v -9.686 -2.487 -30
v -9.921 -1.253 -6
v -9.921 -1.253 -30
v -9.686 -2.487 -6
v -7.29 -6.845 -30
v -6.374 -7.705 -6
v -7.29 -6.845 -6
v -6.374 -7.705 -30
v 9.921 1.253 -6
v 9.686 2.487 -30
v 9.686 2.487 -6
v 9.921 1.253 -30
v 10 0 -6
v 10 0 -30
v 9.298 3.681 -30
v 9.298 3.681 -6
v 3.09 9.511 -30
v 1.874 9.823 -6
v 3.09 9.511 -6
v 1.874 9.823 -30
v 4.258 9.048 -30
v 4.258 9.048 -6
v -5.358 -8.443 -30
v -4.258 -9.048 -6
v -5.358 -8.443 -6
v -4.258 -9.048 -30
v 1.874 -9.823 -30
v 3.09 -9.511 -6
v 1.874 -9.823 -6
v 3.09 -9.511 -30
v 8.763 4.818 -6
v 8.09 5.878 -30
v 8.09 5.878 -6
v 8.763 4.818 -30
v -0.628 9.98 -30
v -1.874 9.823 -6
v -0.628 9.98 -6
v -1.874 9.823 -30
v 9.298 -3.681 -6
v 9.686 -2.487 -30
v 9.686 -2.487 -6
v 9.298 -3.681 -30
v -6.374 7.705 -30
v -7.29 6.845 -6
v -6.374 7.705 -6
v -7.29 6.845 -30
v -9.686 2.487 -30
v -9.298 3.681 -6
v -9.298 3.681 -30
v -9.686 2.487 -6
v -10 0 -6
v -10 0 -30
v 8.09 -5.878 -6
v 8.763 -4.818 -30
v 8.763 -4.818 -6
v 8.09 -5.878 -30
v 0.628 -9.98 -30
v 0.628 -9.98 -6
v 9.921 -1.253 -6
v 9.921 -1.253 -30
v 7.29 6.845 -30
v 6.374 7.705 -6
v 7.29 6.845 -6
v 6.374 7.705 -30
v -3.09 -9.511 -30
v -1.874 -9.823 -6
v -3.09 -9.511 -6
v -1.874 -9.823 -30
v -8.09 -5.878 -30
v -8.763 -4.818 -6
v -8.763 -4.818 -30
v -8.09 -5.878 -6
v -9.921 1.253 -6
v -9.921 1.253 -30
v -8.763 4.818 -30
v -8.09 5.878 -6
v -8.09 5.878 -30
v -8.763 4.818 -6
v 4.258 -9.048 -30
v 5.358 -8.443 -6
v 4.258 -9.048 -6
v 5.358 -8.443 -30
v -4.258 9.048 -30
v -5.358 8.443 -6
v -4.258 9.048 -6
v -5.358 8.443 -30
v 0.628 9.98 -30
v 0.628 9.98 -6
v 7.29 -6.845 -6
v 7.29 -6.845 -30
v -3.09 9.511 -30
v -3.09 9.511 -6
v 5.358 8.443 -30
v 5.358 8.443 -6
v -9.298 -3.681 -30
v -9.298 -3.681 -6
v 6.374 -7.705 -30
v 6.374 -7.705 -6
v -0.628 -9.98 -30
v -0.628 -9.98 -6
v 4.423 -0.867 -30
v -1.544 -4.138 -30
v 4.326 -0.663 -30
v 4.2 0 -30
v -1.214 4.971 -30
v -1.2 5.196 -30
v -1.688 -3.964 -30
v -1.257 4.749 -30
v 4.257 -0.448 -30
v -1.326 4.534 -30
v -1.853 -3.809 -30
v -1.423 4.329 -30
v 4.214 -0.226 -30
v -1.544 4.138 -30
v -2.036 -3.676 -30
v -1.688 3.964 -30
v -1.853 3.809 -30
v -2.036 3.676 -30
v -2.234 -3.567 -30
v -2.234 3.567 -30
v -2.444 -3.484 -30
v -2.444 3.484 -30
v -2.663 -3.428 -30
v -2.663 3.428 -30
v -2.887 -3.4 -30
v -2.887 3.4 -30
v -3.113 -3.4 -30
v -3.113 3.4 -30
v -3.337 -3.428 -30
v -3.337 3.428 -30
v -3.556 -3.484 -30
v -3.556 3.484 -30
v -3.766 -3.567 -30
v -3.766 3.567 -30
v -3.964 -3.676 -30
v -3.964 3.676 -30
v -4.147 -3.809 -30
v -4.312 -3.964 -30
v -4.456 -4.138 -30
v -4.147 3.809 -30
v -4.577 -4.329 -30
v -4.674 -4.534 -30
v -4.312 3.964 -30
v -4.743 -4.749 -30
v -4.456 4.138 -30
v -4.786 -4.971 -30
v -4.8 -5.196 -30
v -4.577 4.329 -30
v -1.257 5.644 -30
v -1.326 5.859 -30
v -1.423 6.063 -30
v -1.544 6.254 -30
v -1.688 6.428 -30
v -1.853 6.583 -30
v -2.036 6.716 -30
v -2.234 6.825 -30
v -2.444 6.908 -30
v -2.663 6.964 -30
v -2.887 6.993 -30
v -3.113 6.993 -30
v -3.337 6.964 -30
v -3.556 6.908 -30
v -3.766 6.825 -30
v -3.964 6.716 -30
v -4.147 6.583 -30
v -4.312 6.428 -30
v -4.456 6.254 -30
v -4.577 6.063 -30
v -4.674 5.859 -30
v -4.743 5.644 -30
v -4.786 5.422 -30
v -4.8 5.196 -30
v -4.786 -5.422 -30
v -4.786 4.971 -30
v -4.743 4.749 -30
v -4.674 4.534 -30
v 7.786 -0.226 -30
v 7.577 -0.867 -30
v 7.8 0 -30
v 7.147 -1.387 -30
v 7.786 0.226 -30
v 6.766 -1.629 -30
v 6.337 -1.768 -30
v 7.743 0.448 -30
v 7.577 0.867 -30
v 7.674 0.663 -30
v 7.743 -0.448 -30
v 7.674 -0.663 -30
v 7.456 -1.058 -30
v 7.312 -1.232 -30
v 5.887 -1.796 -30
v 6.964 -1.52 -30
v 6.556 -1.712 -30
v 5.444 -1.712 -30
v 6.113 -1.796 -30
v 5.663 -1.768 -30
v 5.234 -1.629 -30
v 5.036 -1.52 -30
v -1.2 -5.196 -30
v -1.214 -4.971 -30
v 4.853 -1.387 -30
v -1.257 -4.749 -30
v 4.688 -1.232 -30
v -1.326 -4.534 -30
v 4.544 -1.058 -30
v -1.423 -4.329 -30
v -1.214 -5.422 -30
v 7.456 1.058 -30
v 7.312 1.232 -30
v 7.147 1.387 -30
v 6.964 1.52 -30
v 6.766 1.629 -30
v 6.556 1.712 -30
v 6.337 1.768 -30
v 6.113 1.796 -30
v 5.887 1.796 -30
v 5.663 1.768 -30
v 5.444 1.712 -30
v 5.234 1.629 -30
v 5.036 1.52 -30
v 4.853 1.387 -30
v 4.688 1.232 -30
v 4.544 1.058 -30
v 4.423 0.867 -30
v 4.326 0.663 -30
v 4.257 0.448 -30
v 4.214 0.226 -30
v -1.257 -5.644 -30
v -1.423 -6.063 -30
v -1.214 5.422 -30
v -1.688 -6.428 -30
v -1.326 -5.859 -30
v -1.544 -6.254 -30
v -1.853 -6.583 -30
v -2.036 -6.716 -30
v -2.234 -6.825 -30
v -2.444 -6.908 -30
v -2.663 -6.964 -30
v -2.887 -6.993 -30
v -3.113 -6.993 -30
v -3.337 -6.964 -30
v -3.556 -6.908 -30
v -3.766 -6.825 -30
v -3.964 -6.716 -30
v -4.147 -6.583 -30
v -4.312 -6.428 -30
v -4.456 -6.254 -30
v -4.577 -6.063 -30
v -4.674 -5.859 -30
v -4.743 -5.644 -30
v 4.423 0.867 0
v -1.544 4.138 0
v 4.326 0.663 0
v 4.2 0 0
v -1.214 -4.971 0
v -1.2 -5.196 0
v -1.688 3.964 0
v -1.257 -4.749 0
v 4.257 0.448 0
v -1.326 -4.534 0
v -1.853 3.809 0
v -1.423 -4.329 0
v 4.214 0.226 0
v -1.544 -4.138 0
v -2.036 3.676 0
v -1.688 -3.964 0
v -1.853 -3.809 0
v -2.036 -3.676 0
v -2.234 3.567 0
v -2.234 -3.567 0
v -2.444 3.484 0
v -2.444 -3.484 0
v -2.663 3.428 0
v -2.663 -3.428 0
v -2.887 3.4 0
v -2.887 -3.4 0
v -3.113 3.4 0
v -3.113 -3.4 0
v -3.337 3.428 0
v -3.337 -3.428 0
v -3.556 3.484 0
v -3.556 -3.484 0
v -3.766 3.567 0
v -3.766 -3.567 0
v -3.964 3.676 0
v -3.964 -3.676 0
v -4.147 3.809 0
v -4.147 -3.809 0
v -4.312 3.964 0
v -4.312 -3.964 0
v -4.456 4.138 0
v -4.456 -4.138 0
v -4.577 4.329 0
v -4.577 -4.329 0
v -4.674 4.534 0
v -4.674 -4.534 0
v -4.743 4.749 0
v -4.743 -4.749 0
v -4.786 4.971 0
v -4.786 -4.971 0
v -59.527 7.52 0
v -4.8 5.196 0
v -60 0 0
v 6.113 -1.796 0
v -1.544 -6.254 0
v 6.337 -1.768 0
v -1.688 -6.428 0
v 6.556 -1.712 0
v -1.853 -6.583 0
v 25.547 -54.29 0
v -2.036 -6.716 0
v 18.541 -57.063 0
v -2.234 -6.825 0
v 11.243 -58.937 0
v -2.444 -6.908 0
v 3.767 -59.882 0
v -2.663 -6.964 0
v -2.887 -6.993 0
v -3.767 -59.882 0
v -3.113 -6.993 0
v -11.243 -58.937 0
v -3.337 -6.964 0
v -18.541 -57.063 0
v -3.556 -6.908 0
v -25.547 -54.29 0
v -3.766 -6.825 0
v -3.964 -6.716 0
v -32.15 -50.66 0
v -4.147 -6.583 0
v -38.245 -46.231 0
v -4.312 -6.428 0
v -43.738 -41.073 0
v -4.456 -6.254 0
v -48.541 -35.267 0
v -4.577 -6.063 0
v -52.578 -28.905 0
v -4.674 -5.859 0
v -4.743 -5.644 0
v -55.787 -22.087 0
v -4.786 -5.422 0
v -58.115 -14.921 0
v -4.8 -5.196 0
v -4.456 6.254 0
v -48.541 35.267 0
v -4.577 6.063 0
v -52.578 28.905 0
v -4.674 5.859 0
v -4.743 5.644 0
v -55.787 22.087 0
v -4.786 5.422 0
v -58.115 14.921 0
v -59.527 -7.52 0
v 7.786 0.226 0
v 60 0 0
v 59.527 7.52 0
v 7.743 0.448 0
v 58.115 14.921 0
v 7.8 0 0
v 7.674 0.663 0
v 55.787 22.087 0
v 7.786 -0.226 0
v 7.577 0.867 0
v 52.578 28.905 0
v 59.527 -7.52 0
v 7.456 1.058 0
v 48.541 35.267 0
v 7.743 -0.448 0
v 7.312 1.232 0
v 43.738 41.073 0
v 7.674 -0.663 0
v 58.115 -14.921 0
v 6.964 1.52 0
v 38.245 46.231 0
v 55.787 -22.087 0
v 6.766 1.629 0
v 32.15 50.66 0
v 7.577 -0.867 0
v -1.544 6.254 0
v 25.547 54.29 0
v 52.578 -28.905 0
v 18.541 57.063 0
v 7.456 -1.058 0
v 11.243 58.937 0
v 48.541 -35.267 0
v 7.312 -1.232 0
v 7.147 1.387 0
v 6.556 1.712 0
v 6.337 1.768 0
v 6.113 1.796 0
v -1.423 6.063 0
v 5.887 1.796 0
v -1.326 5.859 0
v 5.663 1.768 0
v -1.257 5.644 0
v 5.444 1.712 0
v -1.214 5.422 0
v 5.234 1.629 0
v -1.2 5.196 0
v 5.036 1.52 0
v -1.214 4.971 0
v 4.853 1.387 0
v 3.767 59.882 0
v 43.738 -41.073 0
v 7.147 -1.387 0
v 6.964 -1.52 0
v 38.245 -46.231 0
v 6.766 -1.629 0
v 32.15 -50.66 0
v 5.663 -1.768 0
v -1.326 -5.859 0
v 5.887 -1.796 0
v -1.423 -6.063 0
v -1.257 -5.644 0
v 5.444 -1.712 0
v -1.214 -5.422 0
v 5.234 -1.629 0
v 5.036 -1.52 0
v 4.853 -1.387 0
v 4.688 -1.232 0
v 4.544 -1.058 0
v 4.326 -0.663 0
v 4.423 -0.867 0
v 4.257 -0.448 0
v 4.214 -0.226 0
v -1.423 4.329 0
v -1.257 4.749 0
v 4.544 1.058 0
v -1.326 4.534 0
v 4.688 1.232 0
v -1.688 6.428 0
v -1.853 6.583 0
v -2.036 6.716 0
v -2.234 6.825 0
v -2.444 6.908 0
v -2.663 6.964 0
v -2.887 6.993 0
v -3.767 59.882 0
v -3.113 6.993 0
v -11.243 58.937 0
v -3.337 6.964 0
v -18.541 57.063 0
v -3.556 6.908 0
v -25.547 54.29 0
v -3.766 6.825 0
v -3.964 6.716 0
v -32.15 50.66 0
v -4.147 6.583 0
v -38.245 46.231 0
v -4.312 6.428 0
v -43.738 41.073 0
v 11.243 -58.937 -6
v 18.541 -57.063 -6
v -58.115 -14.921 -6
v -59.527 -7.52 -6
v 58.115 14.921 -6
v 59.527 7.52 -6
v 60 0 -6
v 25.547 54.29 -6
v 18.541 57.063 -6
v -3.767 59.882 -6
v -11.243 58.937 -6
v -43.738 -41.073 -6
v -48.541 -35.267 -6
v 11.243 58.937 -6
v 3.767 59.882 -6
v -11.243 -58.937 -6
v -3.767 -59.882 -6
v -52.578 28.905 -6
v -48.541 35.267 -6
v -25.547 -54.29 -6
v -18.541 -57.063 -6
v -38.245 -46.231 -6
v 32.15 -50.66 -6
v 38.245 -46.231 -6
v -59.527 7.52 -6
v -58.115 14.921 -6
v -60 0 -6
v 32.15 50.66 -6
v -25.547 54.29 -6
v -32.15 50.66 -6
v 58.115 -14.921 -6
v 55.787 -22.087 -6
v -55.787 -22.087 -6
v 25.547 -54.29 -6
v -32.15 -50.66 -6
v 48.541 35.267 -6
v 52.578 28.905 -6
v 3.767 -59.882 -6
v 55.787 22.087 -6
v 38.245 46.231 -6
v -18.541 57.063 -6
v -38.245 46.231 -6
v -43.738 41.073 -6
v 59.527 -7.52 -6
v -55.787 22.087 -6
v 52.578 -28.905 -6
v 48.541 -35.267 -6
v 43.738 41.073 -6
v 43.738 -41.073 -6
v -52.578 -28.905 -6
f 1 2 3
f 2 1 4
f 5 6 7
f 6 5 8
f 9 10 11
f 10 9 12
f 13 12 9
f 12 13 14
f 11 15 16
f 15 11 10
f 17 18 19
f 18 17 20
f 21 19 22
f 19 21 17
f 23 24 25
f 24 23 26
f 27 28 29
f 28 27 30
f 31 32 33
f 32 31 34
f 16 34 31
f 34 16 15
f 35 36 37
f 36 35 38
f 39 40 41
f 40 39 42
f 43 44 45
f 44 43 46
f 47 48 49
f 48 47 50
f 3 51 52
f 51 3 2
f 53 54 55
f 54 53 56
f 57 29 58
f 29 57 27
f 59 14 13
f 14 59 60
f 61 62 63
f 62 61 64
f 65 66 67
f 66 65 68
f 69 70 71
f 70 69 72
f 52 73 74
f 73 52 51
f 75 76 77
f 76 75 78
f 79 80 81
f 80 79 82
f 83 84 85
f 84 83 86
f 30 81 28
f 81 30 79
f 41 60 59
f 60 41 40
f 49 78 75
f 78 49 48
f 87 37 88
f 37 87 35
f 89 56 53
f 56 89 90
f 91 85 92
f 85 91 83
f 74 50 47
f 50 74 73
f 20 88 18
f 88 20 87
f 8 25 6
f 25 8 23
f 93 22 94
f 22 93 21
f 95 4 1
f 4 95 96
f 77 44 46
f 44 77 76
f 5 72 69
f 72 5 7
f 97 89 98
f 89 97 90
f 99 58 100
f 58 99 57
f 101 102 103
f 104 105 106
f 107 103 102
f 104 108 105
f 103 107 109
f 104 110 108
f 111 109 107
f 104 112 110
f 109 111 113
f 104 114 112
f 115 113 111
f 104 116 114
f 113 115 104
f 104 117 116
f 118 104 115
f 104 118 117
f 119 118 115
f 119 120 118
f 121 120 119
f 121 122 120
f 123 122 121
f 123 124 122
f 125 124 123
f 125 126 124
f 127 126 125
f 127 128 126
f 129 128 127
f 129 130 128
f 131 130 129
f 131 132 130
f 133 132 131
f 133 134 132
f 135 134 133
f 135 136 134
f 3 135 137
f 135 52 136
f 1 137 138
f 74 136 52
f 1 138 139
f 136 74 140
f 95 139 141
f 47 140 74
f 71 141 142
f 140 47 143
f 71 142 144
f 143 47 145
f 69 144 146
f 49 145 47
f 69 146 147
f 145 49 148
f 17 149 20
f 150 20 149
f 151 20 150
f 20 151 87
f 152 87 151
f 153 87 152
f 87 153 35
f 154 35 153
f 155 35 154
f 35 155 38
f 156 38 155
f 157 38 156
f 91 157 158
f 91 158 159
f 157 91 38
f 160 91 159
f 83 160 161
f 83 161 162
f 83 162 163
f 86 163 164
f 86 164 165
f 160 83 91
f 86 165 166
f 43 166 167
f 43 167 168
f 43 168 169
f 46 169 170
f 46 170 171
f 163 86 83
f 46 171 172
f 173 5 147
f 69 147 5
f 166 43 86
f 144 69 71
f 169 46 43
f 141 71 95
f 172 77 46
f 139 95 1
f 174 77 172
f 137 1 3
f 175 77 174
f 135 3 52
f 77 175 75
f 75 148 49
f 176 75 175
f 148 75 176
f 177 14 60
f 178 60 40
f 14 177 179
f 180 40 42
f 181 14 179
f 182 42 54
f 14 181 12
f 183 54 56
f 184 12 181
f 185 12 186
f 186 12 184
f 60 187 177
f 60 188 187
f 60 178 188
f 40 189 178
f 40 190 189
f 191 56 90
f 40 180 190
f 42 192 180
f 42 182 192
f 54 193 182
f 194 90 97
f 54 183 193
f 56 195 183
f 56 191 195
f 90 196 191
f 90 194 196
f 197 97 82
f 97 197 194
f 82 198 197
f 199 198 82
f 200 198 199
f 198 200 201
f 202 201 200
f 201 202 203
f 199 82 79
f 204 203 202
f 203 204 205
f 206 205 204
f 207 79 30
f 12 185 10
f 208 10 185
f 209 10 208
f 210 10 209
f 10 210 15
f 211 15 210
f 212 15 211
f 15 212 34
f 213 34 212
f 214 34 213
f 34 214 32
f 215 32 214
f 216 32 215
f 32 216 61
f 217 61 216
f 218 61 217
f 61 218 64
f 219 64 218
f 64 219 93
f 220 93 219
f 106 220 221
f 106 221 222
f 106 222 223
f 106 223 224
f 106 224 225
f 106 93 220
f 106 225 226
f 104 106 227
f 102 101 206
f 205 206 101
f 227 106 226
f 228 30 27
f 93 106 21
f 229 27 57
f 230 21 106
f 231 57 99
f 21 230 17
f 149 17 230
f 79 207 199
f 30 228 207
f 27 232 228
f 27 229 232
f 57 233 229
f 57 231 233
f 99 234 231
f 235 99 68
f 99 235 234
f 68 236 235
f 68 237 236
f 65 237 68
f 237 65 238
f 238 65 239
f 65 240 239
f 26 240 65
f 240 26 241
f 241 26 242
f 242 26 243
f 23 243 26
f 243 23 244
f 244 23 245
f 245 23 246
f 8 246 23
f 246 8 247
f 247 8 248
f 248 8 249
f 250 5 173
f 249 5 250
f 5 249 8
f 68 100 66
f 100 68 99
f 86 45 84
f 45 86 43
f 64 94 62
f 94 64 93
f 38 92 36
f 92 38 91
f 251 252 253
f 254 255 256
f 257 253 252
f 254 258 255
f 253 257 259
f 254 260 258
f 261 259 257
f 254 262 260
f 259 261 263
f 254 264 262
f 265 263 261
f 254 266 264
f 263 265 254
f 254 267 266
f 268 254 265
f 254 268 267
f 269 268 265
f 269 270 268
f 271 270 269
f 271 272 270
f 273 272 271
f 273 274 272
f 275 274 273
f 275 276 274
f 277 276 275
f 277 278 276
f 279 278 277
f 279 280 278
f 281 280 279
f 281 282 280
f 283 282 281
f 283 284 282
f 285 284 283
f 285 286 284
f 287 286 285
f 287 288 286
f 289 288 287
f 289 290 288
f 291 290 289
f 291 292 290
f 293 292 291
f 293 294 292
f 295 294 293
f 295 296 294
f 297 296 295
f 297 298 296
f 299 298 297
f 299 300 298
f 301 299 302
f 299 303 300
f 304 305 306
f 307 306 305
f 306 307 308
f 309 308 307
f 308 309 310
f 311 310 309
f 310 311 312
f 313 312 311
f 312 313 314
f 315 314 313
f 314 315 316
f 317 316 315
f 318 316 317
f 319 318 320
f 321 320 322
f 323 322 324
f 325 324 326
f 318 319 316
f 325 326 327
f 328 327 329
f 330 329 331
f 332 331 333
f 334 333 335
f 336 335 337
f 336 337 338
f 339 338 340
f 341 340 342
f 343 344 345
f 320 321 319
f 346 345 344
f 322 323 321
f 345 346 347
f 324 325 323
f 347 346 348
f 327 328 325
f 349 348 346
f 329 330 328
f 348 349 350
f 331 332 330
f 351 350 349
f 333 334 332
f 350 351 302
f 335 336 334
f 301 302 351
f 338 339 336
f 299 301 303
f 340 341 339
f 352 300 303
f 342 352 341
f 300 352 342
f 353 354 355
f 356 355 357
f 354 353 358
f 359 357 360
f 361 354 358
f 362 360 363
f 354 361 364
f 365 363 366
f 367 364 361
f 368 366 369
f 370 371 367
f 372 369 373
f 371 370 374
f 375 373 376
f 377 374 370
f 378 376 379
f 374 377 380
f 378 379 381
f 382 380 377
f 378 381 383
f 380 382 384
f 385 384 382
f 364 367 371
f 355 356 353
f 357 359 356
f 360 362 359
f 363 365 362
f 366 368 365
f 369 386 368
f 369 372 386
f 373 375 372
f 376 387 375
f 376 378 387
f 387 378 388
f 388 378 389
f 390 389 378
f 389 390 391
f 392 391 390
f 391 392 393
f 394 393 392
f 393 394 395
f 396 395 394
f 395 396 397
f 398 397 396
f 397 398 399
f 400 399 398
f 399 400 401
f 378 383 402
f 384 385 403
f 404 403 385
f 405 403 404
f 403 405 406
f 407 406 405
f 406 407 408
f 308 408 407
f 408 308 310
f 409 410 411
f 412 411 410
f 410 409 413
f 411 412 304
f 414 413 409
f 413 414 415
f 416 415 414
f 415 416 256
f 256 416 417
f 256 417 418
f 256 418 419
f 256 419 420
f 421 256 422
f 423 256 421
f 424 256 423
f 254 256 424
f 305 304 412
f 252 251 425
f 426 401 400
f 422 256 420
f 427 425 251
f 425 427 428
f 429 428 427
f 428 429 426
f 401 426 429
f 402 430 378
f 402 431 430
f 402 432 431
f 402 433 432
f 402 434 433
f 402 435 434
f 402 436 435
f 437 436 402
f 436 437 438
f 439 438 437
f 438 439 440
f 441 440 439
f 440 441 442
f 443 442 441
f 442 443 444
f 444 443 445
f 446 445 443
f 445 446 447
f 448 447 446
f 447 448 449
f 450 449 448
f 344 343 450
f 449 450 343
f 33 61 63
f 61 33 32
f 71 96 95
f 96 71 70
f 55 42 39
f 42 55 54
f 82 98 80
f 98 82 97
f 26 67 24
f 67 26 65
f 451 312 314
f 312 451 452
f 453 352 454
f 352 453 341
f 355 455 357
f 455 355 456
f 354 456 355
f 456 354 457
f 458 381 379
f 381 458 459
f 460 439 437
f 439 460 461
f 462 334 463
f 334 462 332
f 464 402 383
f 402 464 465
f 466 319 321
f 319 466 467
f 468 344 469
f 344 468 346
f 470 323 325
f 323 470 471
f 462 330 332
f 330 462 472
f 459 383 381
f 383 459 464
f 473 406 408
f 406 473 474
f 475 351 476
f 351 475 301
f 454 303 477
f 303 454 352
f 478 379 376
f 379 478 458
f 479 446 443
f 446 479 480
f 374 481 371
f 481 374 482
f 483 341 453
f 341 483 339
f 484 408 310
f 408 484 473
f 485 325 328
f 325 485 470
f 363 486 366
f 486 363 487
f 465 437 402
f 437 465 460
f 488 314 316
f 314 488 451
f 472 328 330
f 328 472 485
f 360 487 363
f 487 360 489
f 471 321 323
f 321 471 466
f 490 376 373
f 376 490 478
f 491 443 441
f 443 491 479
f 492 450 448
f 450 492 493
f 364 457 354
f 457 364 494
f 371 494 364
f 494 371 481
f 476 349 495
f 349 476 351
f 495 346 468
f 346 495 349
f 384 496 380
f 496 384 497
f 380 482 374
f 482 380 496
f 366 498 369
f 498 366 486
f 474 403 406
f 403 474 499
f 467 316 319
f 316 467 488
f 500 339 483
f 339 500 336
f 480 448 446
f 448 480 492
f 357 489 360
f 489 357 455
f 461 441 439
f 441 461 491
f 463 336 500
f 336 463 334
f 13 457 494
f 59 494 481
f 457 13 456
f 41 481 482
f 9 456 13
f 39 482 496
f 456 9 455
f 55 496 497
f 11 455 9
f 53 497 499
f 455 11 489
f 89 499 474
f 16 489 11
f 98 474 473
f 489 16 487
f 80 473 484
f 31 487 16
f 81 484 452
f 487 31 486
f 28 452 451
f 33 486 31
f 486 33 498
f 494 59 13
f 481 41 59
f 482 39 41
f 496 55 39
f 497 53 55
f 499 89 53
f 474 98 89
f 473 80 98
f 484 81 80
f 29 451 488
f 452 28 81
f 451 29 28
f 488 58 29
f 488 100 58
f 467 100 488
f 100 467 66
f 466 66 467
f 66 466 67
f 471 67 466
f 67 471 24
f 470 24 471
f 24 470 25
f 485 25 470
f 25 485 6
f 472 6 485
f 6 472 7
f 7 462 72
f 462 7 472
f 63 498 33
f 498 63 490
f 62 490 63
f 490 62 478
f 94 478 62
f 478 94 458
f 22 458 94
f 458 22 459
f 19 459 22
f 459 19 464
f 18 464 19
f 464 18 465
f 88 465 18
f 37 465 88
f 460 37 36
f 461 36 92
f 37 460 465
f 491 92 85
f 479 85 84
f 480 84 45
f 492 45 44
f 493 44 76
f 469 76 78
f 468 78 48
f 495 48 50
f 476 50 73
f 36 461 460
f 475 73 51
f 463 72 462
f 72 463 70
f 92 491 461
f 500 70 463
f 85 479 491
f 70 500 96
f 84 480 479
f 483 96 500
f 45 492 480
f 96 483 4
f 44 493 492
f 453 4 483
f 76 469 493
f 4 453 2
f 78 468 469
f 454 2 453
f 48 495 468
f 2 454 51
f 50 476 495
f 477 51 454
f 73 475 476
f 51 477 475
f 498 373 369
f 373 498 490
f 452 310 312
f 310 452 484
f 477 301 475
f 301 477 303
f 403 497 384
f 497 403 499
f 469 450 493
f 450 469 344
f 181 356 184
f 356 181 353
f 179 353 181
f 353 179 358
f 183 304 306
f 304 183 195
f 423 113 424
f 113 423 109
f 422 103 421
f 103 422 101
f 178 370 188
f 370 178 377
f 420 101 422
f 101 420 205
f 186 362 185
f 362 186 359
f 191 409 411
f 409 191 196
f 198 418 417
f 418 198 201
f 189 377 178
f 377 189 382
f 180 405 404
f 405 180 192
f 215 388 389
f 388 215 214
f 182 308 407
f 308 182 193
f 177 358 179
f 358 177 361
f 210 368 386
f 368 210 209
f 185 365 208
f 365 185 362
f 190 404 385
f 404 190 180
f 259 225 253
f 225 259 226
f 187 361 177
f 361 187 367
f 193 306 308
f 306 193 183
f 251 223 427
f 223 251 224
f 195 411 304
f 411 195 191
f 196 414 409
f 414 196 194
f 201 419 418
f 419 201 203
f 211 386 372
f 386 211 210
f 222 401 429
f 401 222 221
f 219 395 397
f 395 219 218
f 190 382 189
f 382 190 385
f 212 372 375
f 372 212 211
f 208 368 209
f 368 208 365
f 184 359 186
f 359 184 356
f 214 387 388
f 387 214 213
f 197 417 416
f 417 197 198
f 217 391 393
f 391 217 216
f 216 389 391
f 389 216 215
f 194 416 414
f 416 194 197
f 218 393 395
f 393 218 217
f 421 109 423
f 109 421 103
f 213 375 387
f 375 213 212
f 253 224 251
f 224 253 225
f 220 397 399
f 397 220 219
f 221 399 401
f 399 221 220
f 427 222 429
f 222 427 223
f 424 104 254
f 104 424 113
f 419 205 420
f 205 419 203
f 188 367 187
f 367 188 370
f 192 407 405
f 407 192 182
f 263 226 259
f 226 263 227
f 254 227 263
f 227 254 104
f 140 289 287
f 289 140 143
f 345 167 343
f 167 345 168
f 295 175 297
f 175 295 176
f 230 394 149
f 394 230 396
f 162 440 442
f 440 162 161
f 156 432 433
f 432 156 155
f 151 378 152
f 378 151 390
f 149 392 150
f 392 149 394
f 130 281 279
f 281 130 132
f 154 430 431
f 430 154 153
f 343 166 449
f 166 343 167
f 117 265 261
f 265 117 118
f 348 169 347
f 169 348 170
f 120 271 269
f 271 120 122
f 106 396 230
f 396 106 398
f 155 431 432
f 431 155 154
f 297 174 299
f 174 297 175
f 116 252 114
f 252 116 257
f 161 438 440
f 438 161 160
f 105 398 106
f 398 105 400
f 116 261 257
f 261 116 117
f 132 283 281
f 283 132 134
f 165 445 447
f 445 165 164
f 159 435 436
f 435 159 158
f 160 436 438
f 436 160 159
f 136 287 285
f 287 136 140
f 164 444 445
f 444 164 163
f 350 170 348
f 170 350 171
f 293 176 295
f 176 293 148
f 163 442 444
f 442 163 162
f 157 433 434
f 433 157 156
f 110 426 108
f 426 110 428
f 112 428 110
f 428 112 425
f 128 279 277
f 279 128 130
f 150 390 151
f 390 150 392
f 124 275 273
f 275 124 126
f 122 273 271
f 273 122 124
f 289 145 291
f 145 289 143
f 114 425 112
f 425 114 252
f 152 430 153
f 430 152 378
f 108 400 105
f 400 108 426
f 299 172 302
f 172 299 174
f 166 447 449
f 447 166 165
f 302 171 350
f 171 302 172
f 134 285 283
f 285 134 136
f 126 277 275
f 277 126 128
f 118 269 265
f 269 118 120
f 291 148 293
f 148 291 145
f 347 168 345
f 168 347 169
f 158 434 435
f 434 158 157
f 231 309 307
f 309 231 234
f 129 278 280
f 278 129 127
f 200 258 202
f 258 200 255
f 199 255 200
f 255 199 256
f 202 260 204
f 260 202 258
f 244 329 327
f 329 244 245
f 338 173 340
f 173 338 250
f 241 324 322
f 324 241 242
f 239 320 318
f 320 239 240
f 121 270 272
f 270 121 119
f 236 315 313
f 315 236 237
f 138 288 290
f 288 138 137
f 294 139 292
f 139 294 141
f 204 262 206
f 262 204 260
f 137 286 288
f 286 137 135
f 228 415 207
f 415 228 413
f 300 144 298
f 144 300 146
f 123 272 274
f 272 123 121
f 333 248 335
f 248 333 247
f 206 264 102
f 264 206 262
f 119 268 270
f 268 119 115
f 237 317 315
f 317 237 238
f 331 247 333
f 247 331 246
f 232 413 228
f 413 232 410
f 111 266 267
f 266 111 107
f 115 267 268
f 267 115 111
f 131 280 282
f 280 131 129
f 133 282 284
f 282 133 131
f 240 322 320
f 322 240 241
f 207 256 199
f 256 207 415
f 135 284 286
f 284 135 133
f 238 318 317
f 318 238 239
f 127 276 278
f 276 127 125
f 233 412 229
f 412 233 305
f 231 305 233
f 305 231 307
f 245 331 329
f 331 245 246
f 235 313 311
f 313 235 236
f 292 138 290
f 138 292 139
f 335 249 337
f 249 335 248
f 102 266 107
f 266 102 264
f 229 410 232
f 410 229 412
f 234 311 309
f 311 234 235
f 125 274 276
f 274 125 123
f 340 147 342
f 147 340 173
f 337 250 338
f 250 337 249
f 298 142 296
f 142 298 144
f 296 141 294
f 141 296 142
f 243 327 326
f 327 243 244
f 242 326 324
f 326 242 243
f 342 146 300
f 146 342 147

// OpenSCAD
$fn = 50;


difference() {
	union() {
		translate(v = [0, 0, -30.0000000000]) {
			cylinder(h = 30, r = 10.0000000000);
		}
		translate(v = [0, 0, -6.0000000000]) {
			cylinder(h = 6, r = 60.0000000000);
		}
	}
	union() {
		#translate(v = [6.0000000000, 0.0000000000, -30]) {
			cylinder(h = 30, r = 1.8000000000);
		}
		#translate(v = [-3.0000000000, 5.1961524227, -30]) {
			cylinder(h = 30, r = 1.8000000000);
		}
		#translate(v = [-3.0000000000, -5.1961524227, -30]) {
			cylinder(h = 30, r = 1.8000000000);
		}
	}
}
